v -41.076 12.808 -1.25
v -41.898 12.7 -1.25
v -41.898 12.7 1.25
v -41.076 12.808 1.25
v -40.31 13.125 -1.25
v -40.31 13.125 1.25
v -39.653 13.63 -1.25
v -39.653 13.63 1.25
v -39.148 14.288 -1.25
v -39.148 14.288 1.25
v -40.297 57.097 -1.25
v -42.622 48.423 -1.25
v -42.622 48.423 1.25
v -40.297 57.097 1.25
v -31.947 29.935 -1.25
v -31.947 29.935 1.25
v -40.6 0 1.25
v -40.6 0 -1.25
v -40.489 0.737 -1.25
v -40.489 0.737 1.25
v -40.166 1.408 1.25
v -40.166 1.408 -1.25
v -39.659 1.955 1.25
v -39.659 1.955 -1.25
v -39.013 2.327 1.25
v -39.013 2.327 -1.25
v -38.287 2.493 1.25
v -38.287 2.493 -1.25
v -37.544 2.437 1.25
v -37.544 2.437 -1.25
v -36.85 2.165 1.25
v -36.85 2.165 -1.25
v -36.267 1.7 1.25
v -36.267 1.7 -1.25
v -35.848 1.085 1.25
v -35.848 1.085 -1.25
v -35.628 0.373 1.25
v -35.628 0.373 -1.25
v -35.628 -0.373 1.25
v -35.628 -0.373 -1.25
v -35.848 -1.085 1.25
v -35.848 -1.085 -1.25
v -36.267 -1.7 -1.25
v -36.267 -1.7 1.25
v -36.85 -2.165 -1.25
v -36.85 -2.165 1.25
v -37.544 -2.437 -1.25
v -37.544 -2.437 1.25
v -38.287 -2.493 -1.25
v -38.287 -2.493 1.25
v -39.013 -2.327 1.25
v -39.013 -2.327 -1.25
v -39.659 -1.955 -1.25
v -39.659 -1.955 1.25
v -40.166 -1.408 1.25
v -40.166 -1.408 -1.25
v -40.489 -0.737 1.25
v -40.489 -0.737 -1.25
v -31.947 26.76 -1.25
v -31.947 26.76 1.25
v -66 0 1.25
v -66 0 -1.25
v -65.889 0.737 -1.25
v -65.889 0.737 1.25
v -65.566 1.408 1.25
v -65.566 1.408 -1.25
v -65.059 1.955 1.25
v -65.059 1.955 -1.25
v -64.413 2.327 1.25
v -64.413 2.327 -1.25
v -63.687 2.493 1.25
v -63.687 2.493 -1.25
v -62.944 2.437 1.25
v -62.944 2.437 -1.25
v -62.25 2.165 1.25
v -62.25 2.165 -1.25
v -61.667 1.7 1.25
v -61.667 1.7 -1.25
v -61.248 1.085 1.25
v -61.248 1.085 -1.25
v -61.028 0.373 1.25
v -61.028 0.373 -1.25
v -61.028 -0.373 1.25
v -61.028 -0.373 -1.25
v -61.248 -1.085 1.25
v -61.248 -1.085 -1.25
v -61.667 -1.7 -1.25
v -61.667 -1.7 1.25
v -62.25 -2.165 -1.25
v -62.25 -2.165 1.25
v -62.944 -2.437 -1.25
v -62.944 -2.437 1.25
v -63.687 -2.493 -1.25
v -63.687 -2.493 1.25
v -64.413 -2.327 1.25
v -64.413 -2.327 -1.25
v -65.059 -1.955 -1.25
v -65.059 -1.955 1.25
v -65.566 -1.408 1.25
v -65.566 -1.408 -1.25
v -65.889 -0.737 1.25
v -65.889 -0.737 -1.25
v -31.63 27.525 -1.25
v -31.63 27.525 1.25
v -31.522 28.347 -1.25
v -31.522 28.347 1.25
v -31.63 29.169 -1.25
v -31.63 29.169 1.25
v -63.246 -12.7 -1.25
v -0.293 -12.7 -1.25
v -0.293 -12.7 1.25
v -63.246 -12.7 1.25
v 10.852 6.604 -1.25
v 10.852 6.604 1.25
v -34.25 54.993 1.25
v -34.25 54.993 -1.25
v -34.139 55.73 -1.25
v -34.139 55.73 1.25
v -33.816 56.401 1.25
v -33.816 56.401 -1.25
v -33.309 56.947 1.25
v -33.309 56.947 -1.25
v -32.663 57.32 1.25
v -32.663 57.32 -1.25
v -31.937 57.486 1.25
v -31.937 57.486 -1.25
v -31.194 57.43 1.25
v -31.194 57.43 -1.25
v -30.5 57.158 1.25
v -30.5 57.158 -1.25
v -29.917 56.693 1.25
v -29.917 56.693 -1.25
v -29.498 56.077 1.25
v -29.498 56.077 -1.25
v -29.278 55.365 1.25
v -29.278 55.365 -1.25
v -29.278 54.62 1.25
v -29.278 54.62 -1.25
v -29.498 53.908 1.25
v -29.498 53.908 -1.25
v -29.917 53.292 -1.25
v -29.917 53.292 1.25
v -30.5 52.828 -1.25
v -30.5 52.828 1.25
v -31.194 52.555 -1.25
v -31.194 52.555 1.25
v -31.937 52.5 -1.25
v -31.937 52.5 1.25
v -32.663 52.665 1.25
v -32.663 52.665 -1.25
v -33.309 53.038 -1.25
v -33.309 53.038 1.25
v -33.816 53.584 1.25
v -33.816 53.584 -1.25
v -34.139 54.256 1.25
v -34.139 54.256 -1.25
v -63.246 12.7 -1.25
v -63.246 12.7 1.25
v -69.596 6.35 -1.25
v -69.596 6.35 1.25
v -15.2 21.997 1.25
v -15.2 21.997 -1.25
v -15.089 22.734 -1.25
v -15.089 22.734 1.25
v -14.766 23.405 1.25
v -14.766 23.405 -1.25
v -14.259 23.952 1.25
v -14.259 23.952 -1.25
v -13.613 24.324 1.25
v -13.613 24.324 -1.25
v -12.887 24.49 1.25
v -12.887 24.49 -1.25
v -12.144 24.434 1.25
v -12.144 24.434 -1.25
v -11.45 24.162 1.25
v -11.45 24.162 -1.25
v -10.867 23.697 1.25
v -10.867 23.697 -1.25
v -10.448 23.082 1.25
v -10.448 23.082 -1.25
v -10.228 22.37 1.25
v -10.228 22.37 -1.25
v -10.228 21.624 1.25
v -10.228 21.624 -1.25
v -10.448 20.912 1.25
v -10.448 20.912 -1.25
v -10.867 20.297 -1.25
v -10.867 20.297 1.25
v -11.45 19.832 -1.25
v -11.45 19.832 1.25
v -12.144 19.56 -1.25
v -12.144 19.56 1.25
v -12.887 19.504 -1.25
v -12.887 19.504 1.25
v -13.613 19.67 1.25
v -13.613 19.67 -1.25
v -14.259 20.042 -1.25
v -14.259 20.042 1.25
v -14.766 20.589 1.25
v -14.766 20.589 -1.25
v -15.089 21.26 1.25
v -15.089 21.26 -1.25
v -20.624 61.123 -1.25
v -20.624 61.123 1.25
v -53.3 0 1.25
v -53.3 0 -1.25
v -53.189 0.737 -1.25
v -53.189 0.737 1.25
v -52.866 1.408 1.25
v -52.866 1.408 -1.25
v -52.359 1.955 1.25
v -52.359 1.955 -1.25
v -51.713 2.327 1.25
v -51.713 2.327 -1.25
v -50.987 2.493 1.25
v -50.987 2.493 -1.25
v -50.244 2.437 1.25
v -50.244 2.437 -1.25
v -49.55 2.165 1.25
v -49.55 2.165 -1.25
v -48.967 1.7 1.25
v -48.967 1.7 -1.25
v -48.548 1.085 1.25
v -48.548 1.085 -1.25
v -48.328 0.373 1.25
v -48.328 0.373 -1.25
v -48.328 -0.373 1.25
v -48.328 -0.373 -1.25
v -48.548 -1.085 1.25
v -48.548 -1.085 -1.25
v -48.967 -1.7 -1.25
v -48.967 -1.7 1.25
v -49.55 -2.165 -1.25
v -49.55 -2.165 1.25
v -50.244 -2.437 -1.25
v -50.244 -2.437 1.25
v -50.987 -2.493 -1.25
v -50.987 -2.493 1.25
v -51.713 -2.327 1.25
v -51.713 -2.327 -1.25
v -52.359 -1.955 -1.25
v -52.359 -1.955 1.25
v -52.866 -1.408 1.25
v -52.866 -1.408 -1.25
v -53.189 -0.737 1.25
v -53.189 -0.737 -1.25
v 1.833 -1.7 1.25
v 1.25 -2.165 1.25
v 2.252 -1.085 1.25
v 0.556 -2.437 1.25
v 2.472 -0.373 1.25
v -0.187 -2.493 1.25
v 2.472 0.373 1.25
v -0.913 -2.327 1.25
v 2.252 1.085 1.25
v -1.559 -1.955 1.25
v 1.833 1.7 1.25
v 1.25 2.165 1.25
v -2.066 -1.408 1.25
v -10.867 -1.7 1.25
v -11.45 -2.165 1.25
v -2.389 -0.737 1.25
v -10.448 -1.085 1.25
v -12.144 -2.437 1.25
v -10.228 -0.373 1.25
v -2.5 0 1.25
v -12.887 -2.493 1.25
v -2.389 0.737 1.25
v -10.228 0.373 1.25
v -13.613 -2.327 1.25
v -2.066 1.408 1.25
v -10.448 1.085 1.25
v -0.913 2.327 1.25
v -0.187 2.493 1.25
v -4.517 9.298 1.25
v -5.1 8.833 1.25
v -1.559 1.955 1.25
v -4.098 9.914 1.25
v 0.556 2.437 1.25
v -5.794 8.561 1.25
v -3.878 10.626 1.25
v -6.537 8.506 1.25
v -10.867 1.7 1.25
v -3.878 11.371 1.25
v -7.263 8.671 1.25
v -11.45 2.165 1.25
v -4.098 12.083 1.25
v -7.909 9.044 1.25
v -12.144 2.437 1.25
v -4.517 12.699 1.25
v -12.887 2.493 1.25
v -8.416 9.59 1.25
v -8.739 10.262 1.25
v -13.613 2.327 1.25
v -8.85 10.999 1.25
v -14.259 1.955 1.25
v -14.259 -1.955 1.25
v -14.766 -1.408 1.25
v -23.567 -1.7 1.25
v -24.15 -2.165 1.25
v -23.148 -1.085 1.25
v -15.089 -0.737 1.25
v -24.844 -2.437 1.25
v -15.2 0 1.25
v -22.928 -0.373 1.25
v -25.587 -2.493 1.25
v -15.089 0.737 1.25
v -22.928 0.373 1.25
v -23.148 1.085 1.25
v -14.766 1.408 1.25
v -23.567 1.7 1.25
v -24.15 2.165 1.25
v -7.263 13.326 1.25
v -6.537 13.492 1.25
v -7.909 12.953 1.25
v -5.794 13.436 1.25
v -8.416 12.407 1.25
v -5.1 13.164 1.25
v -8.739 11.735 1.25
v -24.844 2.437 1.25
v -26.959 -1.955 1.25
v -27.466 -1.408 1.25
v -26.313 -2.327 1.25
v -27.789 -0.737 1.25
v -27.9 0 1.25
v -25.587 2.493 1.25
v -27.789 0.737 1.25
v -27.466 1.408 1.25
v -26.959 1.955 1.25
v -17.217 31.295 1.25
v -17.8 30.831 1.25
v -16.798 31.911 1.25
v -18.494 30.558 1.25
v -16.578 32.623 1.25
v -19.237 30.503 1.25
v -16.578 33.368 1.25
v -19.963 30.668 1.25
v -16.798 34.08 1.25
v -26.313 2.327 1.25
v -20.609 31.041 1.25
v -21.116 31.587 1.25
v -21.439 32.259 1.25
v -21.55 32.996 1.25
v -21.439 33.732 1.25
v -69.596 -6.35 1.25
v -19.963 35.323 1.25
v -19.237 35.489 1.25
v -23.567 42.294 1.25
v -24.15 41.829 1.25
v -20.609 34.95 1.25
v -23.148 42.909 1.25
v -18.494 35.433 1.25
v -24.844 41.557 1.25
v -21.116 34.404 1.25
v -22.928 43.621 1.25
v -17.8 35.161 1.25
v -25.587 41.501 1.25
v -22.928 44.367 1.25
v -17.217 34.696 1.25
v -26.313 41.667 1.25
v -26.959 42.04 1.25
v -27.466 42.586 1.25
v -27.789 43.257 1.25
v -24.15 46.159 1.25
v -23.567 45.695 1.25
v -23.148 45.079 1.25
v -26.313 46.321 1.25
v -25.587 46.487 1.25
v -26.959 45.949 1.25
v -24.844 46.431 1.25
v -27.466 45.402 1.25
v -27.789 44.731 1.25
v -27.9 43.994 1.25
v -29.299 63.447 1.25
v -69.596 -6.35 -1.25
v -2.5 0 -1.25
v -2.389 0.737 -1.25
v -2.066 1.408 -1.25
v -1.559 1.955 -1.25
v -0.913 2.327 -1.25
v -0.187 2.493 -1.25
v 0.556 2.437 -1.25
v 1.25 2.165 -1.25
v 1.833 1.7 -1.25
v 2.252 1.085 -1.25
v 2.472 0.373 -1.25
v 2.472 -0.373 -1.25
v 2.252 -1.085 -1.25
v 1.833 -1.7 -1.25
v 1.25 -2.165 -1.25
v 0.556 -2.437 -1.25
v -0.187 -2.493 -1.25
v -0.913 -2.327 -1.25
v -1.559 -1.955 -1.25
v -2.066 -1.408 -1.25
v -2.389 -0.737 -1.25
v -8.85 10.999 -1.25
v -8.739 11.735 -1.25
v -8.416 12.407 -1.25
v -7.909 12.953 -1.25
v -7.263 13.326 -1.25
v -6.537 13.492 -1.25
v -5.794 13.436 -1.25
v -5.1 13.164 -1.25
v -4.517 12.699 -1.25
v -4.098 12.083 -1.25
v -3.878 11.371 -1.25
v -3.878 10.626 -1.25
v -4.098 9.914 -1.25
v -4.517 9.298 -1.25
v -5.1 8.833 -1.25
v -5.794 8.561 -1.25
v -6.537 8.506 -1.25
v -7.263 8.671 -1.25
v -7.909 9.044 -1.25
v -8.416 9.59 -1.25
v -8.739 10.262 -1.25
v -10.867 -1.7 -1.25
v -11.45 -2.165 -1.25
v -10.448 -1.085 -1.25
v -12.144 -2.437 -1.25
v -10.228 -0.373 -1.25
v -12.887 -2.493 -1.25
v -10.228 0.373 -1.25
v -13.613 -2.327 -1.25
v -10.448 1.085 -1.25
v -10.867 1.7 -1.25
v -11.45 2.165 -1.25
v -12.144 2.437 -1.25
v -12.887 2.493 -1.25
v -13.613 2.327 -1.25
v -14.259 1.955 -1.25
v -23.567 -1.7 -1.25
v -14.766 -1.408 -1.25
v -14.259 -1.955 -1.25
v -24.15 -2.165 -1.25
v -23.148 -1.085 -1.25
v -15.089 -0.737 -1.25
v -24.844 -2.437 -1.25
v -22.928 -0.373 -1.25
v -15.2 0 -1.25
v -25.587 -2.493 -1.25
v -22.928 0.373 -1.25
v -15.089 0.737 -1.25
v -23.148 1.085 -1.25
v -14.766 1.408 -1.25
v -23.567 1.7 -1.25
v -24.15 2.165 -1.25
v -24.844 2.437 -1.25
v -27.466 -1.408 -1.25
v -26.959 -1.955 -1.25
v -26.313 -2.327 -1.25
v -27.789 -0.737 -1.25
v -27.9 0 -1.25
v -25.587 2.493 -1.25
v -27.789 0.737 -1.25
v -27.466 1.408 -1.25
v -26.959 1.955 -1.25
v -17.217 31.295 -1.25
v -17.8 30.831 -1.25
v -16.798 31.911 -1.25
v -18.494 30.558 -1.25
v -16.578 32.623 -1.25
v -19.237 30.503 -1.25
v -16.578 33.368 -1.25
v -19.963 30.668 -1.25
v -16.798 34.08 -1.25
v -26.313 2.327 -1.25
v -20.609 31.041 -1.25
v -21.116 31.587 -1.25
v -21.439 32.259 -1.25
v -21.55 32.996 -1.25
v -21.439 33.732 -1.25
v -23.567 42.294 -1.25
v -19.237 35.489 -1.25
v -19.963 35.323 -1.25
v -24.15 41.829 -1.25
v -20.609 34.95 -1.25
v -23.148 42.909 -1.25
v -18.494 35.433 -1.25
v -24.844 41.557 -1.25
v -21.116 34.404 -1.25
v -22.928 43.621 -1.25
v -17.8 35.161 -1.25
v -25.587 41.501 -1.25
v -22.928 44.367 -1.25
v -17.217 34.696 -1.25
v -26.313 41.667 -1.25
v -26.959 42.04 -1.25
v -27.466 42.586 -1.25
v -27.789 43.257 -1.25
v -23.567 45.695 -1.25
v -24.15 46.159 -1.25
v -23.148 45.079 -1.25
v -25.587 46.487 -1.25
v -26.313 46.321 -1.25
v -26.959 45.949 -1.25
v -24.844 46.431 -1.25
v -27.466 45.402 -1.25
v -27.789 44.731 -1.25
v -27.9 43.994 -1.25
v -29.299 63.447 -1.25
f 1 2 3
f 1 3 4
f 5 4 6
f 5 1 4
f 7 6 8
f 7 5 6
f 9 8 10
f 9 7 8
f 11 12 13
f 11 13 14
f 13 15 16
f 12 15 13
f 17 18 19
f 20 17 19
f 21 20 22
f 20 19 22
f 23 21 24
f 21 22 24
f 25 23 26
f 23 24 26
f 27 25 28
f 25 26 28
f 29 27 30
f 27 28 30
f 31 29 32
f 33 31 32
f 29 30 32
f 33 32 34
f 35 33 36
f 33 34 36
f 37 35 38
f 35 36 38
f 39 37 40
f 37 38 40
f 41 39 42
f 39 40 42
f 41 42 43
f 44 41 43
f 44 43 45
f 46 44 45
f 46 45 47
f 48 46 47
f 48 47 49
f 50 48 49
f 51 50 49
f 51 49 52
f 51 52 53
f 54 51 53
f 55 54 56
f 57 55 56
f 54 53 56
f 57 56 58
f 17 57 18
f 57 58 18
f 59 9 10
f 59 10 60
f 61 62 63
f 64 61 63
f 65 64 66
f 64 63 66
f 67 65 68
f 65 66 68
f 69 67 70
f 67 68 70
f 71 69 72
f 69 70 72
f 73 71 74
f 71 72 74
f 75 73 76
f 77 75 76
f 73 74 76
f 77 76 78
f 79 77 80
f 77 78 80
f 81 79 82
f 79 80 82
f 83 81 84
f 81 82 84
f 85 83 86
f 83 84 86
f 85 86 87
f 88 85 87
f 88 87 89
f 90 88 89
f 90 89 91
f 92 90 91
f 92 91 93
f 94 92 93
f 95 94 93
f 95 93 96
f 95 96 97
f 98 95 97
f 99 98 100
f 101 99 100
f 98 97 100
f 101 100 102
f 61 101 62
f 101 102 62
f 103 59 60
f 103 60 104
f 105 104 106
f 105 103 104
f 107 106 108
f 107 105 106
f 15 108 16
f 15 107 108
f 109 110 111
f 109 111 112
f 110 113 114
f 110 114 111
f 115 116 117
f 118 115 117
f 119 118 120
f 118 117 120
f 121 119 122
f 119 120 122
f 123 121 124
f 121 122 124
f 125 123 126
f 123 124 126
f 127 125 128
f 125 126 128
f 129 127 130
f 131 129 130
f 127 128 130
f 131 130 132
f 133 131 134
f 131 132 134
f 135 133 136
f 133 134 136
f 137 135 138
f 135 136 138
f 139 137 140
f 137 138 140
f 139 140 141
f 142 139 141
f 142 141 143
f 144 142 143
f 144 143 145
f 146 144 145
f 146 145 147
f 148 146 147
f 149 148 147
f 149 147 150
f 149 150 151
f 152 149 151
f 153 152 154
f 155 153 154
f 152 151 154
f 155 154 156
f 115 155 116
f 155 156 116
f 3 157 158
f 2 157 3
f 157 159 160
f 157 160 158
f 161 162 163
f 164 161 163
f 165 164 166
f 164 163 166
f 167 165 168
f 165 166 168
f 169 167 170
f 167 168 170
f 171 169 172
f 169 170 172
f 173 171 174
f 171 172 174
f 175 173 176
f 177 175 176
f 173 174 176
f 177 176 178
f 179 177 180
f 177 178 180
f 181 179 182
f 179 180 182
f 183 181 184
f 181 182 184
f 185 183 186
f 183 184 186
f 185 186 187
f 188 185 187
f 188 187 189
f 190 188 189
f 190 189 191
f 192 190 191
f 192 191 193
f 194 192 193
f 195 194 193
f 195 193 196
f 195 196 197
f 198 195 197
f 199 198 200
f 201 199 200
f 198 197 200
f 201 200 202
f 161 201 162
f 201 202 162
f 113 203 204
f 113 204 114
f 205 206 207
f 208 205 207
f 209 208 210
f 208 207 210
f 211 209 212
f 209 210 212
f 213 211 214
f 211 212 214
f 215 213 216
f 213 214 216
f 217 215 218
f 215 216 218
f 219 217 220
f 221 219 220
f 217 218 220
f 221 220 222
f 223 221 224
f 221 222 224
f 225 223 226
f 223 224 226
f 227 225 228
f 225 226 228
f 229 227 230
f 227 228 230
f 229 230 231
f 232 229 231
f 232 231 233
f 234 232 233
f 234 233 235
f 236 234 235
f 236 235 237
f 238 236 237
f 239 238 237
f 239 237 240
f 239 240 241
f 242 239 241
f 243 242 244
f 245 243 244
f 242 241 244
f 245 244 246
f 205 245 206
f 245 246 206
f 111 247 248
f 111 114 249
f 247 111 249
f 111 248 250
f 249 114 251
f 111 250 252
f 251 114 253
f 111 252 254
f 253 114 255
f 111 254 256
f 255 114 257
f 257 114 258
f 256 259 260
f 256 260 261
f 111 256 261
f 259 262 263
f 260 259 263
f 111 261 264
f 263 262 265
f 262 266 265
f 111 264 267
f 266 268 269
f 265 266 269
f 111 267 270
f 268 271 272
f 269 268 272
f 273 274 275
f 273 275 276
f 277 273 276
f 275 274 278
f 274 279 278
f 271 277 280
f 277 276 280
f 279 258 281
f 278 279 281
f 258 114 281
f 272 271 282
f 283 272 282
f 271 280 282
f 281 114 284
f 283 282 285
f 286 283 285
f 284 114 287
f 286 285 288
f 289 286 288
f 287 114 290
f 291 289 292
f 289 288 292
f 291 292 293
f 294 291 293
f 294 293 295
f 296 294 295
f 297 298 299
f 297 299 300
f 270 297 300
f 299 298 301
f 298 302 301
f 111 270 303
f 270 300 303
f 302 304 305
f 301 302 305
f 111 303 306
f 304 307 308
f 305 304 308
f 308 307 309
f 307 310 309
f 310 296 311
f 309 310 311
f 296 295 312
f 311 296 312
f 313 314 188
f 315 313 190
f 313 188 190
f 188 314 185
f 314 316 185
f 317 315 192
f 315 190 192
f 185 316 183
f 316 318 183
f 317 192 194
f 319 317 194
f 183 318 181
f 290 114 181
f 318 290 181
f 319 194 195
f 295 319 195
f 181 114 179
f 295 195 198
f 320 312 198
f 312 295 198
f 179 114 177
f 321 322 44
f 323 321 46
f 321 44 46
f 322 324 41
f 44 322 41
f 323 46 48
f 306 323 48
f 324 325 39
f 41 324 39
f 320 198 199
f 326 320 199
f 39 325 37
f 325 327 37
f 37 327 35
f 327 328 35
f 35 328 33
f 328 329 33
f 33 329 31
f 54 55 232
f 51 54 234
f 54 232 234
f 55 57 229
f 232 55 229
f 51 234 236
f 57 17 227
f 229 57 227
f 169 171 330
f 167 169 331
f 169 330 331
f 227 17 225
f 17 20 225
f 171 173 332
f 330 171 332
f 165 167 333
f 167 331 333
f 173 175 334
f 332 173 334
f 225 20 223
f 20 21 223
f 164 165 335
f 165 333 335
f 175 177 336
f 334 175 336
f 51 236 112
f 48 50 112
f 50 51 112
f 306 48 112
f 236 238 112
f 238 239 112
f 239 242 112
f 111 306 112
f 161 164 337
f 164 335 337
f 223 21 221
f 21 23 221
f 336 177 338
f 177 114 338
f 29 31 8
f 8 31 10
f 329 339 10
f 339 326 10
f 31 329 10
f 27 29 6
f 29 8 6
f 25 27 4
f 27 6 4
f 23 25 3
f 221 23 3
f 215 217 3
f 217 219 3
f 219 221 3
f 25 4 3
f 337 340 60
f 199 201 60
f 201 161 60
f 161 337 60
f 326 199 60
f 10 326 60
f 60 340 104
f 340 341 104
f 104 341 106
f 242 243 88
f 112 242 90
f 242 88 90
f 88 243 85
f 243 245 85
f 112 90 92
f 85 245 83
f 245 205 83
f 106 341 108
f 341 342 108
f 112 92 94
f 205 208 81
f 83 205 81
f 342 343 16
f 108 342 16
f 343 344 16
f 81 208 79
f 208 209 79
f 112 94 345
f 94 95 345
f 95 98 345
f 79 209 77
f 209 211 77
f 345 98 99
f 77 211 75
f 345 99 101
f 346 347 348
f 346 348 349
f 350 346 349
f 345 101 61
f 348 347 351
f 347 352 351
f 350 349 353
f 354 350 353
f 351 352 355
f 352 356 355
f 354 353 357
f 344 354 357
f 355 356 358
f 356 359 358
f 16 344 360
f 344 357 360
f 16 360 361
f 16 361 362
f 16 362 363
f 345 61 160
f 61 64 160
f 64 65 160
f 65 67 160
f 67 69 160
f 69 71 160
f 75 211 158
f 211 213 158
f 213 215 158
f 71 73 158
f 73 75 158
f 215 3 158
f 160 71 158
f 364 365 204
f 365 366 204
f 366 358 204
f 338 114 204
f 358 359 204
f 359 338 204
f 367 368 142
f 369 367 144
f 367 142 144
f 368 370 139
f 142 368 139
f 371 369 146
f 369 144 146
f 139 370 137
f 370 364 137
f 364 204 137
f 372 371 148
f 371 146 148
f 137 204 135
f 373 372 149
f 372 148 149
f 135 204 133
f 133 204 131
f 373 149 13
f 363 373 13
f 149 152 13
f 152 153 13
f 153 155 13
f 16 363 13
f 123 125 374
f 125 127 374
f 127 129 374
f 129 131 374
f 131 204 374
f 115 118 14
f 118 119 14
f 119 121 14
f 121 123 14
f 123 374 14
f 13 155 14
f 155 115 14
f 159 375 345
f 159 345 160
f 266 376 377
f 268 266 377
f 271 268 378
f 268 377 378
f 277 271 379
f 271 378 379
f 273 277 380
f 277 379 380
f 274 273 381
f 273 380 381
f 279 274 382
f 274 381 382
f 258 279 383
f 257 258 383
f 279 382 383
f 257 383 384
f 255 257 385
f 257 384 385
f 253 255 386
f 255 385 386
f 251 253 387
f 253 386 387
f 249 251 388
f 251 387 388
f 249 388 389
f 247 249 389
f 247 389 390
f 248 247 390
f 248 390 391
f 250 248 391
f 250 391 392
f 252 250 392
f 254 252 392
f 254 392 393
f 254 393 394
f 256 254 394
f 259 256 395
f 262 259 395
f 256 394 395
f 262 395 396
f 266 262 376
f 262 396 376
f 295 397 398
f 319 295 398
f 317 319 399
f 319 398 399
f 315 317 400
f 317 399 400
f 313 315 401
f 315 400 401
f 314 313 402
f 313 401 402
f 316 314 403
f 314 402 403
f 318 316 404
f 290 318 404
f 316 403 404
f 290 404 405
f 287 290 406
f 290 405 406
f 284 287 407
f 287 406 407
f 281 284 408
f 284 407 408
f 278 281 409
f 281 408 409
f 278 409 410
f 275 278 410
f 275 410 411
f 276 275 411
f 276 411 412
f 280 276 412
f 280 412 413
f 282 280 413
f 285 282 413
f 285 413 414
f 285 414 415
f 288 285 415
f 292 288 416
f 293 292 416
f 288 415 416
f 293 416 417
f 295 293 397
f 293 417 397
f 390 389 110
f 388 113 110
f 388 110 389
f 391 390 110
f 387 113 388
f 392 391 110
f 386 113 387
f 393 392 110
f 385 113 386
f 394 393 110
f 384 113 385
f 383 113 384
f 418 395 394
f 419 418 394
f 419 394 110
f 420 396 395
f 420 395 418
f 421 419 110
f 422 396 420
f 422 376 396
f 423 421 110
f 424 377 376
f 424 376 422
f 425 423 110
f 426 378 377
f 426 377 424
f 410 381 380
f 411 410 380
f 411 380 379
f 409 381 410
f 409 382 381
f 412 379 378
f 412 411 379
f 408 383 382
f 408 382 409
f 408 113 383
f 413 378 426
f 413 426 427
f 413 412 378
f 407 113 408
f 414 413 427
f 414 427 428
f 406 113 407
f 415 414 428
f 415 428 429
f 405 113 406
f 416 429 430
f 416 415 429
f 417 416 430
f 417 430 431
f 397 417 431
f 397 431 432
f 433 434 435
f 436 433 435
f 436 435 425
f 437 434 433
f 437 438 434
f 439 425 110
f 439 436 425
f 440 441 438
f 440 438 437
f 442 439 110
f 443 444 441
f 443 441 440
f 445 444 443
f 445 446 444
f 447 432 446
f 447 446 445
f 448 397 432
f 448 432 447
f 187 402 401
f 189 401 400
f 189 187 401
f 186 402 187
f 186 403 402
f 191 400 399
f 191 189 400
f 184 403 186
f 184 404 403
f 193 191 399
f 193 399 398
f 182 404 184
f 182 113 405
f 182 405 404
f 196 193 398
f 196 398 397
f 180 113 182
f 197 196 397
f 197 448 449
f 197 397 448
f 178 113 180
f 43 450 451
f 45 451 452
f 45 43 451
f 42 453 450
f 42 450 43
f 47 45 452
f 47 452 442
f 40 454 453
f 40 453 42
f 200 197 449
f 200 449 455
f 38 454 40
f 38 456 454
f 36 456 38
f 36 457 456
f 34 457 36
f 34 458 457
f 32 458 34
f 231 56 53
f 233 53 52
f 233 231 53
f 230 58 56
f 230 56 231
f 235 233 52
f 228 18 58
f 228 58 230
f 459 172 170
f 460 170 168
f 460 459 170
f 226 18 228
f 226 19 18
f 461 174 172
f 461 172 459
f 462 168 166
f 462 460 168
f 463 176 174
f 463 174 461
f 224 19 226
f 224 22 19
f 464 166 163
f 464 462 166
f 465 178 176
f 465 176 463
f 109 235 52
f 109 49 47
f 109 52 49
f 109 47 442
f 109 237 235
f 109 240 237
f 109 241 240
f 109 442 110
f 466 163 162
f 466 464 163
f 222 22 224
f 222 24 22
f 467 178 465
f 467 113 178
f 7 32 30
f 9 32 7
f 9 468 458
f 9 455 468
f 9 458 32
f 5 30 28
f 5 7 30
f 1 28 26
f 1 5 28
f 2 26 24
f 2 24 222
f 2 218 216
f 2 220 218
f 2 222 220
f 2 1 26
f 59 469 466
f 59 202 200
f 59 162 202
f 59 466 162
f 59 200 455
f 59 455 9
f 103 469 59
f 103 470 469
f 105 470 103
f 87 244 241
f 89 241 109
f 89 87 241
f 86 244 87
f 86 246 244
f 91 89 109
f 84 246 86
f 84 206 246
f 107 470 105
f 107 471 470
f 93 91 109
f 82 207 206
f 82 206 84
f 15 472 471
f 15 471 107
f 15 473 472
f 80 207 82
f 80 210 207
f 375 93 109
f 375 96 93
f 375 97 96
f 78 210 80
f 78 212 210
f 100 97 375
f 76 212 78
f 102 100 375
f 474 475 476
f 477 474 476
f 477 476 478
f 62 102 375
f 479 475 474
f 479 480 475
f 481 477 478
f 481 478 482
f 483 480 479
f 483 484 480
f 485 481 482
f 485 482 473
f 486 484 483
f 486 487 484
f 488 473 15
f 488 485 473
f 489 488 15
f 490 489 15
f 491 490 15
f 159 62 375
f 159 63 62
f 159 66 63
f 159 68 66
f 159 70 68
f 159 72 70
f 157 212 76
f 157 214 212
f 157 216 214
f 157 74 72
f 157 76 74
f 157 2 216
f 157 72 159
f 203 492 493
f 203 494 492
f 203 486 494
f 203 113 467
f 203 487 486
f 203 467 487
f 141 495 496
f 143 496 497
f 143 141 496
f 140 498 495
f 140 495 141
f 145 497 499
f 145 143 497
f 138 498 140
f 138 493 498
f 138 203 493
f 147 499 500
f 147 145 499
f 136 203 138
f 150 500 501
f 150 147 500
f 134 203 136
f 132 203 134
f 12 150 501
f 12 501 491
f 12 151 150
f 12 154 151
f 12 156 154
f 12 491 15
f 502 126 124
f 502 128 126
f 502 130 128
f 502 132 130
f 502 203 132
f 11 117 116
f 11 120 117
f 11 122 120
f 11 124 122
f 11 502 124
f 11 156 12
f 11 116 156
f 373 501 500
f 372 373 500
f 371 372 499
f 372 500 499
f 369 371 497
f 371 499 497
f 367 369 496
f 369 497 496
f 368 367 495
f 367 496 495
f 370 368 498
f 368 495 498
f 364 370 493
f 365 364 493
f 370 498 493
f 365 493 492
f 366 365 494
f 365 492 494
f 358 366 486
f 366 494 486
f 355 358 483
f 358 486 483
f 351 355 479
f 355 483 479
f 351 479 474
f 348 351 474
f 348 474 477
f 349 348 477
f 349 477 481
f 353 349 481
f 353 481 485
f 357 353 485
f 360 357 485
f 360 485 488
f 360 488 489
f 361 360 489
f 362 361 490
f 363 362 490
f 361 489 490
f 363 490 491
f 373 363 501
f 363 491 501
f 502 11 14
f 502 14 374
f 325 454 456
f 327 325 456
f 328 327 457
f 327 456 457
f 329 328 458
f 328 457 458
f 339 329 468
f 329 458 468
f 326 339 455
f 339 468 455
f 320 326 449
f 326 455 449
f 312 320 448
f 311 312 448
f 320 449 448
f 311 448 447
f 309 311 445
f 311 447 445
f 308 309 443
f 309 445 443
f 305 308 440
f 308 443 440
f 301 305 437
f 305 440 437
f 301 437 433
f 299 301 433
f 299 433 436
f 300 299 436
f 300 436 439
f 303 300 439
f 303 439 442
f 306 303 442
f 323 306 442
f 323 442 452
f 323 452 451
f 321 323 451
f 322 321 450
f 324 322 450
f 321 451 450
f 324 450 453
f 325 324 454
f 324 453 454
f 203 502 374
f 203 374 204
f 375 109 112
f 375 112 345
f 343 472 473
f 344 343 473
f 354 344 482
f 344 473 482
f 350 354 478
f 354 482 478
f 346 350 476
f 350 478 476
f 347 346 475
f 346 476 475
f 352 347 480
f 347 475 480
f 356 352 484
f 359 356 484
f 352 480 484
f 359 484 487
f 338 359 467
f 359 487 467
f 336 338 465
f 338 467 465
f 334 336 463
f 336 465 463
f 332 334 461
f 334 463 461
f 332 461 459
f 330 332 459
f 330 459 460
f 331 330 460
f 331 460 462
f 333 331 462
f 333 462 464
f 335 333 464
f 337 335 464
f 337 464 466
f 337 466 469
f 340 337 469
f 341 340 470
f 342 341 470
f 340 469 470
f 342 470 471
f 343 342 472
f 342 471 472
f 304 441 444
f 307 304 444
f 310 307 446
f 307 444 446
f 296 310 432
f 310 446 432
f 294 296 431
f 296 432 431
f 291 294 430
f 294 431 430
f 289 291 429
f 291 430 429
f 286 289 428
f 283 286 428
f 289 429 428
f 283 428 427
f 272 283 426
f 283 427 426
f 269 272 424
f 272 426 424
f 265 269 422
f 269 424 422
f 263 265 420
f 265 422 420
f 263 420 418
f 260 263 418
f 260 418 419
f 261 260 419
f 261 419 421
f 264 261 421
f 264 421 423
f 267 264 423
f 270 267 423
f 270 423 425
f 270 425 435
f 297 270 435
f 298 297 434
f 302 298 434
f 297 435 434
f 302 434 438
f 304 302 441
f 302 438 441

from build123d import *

# Parameters (mm, degrees)
SKETCH1_R           = 2.5
BOSS_EXTRUDE1_DEPTH = 2.5


with BuildPart() as part:
    # Sketch1 → Boss-Extrude1 (new body)
    with BuildSketch(Plane(origin=(0, 0, -1.25), x_dir=(-1, 0, 0), z_dir=(0, 0, -1))):
        with BuildLine():
            Line((0.293293937, -12.7), (63.246, -12.7))
            Line((63.246, -12.7), (69.596, -6.35))
            Line((69.596, -6.35), (69.596, 6.35))
            Line((69.596, 6.35), (63.246, 12.7))
            Line((63.246, 12.7), (41.897783942, 12.7))
            ThreePointArc((41.897783942, 12.7), (40.310283942, 13.125369343), (39.148153285, 14.2875))
            Line((39.148153285, 14.2875), (31.947414599, 26.759545256))
            ThreePointArc((31.947414599, 26.759545256), (31.522045256, 28.347045256), (31.947414599, 29.934545256))
            Line((31.947414599, 29.934545256), (42.621522628, 48.422642688))
            Line((42.621522628, 48.422642688), (40.297261314, 57.096904002))
            Line((40.297261314, 57.096904002), (29.298738686, 63.446904002))
            Line((29.298738686, 63.446904002), (20.624477372, 61.122642688))
            Line((20.624477372, 61.122642688), (-10.85187566, 6.604))
            Line((-10.85187566, 6.604), (0.293293937, -12.7))
        make_face()
        with Locations((12.7, 0)):
            Circle(SKETCH1_R, mode=Mode.SUBTRACT)
        with Locations((25.4, 0)):
            Circle(SKETCH1_R, mode=Mode.SUBTRACT)
        with Locations((38.1, 0)):
            Circle(SKETCH1_R, mode=Mode.SUBTRACT)
        Circle(SKETCH1_R, mode=Mode.SUBTRACT)
        with Locations((63.5, 0)):
            Circle(SKETCH1_R, mode=Mode.SUBTRACT)
        with Locations((50.8, 0)):
            Circle(SKETCH1_R, mode=Mode.SUBTRACT)
        with Locations((31.75, 54.99261314)):
            Circle(SKETCH1_R, mode=Mode.SUBTRACT)
        with Locations((25.4, 43.994090512)):
            Circle(SKETCH1_R, mode=Mode.SUBTRACT)
        with Locations((19.05, 32.995567884)):
            Circle(SKETCH1_R, mode=Mode.SUBTRACT)
        with Locations((12.7, 21.997045256)):
            Circle(SKETCH1_R, mode=Mode.SUBTRACT)
        with Locations((6.35, 10.998522628)):
            Circle(SKETCH1_R, mode=Mode.SUBTRACT)
    extrude(amount=-BOSS_EXTRUDE1_DEPTH)


solid = part.part
